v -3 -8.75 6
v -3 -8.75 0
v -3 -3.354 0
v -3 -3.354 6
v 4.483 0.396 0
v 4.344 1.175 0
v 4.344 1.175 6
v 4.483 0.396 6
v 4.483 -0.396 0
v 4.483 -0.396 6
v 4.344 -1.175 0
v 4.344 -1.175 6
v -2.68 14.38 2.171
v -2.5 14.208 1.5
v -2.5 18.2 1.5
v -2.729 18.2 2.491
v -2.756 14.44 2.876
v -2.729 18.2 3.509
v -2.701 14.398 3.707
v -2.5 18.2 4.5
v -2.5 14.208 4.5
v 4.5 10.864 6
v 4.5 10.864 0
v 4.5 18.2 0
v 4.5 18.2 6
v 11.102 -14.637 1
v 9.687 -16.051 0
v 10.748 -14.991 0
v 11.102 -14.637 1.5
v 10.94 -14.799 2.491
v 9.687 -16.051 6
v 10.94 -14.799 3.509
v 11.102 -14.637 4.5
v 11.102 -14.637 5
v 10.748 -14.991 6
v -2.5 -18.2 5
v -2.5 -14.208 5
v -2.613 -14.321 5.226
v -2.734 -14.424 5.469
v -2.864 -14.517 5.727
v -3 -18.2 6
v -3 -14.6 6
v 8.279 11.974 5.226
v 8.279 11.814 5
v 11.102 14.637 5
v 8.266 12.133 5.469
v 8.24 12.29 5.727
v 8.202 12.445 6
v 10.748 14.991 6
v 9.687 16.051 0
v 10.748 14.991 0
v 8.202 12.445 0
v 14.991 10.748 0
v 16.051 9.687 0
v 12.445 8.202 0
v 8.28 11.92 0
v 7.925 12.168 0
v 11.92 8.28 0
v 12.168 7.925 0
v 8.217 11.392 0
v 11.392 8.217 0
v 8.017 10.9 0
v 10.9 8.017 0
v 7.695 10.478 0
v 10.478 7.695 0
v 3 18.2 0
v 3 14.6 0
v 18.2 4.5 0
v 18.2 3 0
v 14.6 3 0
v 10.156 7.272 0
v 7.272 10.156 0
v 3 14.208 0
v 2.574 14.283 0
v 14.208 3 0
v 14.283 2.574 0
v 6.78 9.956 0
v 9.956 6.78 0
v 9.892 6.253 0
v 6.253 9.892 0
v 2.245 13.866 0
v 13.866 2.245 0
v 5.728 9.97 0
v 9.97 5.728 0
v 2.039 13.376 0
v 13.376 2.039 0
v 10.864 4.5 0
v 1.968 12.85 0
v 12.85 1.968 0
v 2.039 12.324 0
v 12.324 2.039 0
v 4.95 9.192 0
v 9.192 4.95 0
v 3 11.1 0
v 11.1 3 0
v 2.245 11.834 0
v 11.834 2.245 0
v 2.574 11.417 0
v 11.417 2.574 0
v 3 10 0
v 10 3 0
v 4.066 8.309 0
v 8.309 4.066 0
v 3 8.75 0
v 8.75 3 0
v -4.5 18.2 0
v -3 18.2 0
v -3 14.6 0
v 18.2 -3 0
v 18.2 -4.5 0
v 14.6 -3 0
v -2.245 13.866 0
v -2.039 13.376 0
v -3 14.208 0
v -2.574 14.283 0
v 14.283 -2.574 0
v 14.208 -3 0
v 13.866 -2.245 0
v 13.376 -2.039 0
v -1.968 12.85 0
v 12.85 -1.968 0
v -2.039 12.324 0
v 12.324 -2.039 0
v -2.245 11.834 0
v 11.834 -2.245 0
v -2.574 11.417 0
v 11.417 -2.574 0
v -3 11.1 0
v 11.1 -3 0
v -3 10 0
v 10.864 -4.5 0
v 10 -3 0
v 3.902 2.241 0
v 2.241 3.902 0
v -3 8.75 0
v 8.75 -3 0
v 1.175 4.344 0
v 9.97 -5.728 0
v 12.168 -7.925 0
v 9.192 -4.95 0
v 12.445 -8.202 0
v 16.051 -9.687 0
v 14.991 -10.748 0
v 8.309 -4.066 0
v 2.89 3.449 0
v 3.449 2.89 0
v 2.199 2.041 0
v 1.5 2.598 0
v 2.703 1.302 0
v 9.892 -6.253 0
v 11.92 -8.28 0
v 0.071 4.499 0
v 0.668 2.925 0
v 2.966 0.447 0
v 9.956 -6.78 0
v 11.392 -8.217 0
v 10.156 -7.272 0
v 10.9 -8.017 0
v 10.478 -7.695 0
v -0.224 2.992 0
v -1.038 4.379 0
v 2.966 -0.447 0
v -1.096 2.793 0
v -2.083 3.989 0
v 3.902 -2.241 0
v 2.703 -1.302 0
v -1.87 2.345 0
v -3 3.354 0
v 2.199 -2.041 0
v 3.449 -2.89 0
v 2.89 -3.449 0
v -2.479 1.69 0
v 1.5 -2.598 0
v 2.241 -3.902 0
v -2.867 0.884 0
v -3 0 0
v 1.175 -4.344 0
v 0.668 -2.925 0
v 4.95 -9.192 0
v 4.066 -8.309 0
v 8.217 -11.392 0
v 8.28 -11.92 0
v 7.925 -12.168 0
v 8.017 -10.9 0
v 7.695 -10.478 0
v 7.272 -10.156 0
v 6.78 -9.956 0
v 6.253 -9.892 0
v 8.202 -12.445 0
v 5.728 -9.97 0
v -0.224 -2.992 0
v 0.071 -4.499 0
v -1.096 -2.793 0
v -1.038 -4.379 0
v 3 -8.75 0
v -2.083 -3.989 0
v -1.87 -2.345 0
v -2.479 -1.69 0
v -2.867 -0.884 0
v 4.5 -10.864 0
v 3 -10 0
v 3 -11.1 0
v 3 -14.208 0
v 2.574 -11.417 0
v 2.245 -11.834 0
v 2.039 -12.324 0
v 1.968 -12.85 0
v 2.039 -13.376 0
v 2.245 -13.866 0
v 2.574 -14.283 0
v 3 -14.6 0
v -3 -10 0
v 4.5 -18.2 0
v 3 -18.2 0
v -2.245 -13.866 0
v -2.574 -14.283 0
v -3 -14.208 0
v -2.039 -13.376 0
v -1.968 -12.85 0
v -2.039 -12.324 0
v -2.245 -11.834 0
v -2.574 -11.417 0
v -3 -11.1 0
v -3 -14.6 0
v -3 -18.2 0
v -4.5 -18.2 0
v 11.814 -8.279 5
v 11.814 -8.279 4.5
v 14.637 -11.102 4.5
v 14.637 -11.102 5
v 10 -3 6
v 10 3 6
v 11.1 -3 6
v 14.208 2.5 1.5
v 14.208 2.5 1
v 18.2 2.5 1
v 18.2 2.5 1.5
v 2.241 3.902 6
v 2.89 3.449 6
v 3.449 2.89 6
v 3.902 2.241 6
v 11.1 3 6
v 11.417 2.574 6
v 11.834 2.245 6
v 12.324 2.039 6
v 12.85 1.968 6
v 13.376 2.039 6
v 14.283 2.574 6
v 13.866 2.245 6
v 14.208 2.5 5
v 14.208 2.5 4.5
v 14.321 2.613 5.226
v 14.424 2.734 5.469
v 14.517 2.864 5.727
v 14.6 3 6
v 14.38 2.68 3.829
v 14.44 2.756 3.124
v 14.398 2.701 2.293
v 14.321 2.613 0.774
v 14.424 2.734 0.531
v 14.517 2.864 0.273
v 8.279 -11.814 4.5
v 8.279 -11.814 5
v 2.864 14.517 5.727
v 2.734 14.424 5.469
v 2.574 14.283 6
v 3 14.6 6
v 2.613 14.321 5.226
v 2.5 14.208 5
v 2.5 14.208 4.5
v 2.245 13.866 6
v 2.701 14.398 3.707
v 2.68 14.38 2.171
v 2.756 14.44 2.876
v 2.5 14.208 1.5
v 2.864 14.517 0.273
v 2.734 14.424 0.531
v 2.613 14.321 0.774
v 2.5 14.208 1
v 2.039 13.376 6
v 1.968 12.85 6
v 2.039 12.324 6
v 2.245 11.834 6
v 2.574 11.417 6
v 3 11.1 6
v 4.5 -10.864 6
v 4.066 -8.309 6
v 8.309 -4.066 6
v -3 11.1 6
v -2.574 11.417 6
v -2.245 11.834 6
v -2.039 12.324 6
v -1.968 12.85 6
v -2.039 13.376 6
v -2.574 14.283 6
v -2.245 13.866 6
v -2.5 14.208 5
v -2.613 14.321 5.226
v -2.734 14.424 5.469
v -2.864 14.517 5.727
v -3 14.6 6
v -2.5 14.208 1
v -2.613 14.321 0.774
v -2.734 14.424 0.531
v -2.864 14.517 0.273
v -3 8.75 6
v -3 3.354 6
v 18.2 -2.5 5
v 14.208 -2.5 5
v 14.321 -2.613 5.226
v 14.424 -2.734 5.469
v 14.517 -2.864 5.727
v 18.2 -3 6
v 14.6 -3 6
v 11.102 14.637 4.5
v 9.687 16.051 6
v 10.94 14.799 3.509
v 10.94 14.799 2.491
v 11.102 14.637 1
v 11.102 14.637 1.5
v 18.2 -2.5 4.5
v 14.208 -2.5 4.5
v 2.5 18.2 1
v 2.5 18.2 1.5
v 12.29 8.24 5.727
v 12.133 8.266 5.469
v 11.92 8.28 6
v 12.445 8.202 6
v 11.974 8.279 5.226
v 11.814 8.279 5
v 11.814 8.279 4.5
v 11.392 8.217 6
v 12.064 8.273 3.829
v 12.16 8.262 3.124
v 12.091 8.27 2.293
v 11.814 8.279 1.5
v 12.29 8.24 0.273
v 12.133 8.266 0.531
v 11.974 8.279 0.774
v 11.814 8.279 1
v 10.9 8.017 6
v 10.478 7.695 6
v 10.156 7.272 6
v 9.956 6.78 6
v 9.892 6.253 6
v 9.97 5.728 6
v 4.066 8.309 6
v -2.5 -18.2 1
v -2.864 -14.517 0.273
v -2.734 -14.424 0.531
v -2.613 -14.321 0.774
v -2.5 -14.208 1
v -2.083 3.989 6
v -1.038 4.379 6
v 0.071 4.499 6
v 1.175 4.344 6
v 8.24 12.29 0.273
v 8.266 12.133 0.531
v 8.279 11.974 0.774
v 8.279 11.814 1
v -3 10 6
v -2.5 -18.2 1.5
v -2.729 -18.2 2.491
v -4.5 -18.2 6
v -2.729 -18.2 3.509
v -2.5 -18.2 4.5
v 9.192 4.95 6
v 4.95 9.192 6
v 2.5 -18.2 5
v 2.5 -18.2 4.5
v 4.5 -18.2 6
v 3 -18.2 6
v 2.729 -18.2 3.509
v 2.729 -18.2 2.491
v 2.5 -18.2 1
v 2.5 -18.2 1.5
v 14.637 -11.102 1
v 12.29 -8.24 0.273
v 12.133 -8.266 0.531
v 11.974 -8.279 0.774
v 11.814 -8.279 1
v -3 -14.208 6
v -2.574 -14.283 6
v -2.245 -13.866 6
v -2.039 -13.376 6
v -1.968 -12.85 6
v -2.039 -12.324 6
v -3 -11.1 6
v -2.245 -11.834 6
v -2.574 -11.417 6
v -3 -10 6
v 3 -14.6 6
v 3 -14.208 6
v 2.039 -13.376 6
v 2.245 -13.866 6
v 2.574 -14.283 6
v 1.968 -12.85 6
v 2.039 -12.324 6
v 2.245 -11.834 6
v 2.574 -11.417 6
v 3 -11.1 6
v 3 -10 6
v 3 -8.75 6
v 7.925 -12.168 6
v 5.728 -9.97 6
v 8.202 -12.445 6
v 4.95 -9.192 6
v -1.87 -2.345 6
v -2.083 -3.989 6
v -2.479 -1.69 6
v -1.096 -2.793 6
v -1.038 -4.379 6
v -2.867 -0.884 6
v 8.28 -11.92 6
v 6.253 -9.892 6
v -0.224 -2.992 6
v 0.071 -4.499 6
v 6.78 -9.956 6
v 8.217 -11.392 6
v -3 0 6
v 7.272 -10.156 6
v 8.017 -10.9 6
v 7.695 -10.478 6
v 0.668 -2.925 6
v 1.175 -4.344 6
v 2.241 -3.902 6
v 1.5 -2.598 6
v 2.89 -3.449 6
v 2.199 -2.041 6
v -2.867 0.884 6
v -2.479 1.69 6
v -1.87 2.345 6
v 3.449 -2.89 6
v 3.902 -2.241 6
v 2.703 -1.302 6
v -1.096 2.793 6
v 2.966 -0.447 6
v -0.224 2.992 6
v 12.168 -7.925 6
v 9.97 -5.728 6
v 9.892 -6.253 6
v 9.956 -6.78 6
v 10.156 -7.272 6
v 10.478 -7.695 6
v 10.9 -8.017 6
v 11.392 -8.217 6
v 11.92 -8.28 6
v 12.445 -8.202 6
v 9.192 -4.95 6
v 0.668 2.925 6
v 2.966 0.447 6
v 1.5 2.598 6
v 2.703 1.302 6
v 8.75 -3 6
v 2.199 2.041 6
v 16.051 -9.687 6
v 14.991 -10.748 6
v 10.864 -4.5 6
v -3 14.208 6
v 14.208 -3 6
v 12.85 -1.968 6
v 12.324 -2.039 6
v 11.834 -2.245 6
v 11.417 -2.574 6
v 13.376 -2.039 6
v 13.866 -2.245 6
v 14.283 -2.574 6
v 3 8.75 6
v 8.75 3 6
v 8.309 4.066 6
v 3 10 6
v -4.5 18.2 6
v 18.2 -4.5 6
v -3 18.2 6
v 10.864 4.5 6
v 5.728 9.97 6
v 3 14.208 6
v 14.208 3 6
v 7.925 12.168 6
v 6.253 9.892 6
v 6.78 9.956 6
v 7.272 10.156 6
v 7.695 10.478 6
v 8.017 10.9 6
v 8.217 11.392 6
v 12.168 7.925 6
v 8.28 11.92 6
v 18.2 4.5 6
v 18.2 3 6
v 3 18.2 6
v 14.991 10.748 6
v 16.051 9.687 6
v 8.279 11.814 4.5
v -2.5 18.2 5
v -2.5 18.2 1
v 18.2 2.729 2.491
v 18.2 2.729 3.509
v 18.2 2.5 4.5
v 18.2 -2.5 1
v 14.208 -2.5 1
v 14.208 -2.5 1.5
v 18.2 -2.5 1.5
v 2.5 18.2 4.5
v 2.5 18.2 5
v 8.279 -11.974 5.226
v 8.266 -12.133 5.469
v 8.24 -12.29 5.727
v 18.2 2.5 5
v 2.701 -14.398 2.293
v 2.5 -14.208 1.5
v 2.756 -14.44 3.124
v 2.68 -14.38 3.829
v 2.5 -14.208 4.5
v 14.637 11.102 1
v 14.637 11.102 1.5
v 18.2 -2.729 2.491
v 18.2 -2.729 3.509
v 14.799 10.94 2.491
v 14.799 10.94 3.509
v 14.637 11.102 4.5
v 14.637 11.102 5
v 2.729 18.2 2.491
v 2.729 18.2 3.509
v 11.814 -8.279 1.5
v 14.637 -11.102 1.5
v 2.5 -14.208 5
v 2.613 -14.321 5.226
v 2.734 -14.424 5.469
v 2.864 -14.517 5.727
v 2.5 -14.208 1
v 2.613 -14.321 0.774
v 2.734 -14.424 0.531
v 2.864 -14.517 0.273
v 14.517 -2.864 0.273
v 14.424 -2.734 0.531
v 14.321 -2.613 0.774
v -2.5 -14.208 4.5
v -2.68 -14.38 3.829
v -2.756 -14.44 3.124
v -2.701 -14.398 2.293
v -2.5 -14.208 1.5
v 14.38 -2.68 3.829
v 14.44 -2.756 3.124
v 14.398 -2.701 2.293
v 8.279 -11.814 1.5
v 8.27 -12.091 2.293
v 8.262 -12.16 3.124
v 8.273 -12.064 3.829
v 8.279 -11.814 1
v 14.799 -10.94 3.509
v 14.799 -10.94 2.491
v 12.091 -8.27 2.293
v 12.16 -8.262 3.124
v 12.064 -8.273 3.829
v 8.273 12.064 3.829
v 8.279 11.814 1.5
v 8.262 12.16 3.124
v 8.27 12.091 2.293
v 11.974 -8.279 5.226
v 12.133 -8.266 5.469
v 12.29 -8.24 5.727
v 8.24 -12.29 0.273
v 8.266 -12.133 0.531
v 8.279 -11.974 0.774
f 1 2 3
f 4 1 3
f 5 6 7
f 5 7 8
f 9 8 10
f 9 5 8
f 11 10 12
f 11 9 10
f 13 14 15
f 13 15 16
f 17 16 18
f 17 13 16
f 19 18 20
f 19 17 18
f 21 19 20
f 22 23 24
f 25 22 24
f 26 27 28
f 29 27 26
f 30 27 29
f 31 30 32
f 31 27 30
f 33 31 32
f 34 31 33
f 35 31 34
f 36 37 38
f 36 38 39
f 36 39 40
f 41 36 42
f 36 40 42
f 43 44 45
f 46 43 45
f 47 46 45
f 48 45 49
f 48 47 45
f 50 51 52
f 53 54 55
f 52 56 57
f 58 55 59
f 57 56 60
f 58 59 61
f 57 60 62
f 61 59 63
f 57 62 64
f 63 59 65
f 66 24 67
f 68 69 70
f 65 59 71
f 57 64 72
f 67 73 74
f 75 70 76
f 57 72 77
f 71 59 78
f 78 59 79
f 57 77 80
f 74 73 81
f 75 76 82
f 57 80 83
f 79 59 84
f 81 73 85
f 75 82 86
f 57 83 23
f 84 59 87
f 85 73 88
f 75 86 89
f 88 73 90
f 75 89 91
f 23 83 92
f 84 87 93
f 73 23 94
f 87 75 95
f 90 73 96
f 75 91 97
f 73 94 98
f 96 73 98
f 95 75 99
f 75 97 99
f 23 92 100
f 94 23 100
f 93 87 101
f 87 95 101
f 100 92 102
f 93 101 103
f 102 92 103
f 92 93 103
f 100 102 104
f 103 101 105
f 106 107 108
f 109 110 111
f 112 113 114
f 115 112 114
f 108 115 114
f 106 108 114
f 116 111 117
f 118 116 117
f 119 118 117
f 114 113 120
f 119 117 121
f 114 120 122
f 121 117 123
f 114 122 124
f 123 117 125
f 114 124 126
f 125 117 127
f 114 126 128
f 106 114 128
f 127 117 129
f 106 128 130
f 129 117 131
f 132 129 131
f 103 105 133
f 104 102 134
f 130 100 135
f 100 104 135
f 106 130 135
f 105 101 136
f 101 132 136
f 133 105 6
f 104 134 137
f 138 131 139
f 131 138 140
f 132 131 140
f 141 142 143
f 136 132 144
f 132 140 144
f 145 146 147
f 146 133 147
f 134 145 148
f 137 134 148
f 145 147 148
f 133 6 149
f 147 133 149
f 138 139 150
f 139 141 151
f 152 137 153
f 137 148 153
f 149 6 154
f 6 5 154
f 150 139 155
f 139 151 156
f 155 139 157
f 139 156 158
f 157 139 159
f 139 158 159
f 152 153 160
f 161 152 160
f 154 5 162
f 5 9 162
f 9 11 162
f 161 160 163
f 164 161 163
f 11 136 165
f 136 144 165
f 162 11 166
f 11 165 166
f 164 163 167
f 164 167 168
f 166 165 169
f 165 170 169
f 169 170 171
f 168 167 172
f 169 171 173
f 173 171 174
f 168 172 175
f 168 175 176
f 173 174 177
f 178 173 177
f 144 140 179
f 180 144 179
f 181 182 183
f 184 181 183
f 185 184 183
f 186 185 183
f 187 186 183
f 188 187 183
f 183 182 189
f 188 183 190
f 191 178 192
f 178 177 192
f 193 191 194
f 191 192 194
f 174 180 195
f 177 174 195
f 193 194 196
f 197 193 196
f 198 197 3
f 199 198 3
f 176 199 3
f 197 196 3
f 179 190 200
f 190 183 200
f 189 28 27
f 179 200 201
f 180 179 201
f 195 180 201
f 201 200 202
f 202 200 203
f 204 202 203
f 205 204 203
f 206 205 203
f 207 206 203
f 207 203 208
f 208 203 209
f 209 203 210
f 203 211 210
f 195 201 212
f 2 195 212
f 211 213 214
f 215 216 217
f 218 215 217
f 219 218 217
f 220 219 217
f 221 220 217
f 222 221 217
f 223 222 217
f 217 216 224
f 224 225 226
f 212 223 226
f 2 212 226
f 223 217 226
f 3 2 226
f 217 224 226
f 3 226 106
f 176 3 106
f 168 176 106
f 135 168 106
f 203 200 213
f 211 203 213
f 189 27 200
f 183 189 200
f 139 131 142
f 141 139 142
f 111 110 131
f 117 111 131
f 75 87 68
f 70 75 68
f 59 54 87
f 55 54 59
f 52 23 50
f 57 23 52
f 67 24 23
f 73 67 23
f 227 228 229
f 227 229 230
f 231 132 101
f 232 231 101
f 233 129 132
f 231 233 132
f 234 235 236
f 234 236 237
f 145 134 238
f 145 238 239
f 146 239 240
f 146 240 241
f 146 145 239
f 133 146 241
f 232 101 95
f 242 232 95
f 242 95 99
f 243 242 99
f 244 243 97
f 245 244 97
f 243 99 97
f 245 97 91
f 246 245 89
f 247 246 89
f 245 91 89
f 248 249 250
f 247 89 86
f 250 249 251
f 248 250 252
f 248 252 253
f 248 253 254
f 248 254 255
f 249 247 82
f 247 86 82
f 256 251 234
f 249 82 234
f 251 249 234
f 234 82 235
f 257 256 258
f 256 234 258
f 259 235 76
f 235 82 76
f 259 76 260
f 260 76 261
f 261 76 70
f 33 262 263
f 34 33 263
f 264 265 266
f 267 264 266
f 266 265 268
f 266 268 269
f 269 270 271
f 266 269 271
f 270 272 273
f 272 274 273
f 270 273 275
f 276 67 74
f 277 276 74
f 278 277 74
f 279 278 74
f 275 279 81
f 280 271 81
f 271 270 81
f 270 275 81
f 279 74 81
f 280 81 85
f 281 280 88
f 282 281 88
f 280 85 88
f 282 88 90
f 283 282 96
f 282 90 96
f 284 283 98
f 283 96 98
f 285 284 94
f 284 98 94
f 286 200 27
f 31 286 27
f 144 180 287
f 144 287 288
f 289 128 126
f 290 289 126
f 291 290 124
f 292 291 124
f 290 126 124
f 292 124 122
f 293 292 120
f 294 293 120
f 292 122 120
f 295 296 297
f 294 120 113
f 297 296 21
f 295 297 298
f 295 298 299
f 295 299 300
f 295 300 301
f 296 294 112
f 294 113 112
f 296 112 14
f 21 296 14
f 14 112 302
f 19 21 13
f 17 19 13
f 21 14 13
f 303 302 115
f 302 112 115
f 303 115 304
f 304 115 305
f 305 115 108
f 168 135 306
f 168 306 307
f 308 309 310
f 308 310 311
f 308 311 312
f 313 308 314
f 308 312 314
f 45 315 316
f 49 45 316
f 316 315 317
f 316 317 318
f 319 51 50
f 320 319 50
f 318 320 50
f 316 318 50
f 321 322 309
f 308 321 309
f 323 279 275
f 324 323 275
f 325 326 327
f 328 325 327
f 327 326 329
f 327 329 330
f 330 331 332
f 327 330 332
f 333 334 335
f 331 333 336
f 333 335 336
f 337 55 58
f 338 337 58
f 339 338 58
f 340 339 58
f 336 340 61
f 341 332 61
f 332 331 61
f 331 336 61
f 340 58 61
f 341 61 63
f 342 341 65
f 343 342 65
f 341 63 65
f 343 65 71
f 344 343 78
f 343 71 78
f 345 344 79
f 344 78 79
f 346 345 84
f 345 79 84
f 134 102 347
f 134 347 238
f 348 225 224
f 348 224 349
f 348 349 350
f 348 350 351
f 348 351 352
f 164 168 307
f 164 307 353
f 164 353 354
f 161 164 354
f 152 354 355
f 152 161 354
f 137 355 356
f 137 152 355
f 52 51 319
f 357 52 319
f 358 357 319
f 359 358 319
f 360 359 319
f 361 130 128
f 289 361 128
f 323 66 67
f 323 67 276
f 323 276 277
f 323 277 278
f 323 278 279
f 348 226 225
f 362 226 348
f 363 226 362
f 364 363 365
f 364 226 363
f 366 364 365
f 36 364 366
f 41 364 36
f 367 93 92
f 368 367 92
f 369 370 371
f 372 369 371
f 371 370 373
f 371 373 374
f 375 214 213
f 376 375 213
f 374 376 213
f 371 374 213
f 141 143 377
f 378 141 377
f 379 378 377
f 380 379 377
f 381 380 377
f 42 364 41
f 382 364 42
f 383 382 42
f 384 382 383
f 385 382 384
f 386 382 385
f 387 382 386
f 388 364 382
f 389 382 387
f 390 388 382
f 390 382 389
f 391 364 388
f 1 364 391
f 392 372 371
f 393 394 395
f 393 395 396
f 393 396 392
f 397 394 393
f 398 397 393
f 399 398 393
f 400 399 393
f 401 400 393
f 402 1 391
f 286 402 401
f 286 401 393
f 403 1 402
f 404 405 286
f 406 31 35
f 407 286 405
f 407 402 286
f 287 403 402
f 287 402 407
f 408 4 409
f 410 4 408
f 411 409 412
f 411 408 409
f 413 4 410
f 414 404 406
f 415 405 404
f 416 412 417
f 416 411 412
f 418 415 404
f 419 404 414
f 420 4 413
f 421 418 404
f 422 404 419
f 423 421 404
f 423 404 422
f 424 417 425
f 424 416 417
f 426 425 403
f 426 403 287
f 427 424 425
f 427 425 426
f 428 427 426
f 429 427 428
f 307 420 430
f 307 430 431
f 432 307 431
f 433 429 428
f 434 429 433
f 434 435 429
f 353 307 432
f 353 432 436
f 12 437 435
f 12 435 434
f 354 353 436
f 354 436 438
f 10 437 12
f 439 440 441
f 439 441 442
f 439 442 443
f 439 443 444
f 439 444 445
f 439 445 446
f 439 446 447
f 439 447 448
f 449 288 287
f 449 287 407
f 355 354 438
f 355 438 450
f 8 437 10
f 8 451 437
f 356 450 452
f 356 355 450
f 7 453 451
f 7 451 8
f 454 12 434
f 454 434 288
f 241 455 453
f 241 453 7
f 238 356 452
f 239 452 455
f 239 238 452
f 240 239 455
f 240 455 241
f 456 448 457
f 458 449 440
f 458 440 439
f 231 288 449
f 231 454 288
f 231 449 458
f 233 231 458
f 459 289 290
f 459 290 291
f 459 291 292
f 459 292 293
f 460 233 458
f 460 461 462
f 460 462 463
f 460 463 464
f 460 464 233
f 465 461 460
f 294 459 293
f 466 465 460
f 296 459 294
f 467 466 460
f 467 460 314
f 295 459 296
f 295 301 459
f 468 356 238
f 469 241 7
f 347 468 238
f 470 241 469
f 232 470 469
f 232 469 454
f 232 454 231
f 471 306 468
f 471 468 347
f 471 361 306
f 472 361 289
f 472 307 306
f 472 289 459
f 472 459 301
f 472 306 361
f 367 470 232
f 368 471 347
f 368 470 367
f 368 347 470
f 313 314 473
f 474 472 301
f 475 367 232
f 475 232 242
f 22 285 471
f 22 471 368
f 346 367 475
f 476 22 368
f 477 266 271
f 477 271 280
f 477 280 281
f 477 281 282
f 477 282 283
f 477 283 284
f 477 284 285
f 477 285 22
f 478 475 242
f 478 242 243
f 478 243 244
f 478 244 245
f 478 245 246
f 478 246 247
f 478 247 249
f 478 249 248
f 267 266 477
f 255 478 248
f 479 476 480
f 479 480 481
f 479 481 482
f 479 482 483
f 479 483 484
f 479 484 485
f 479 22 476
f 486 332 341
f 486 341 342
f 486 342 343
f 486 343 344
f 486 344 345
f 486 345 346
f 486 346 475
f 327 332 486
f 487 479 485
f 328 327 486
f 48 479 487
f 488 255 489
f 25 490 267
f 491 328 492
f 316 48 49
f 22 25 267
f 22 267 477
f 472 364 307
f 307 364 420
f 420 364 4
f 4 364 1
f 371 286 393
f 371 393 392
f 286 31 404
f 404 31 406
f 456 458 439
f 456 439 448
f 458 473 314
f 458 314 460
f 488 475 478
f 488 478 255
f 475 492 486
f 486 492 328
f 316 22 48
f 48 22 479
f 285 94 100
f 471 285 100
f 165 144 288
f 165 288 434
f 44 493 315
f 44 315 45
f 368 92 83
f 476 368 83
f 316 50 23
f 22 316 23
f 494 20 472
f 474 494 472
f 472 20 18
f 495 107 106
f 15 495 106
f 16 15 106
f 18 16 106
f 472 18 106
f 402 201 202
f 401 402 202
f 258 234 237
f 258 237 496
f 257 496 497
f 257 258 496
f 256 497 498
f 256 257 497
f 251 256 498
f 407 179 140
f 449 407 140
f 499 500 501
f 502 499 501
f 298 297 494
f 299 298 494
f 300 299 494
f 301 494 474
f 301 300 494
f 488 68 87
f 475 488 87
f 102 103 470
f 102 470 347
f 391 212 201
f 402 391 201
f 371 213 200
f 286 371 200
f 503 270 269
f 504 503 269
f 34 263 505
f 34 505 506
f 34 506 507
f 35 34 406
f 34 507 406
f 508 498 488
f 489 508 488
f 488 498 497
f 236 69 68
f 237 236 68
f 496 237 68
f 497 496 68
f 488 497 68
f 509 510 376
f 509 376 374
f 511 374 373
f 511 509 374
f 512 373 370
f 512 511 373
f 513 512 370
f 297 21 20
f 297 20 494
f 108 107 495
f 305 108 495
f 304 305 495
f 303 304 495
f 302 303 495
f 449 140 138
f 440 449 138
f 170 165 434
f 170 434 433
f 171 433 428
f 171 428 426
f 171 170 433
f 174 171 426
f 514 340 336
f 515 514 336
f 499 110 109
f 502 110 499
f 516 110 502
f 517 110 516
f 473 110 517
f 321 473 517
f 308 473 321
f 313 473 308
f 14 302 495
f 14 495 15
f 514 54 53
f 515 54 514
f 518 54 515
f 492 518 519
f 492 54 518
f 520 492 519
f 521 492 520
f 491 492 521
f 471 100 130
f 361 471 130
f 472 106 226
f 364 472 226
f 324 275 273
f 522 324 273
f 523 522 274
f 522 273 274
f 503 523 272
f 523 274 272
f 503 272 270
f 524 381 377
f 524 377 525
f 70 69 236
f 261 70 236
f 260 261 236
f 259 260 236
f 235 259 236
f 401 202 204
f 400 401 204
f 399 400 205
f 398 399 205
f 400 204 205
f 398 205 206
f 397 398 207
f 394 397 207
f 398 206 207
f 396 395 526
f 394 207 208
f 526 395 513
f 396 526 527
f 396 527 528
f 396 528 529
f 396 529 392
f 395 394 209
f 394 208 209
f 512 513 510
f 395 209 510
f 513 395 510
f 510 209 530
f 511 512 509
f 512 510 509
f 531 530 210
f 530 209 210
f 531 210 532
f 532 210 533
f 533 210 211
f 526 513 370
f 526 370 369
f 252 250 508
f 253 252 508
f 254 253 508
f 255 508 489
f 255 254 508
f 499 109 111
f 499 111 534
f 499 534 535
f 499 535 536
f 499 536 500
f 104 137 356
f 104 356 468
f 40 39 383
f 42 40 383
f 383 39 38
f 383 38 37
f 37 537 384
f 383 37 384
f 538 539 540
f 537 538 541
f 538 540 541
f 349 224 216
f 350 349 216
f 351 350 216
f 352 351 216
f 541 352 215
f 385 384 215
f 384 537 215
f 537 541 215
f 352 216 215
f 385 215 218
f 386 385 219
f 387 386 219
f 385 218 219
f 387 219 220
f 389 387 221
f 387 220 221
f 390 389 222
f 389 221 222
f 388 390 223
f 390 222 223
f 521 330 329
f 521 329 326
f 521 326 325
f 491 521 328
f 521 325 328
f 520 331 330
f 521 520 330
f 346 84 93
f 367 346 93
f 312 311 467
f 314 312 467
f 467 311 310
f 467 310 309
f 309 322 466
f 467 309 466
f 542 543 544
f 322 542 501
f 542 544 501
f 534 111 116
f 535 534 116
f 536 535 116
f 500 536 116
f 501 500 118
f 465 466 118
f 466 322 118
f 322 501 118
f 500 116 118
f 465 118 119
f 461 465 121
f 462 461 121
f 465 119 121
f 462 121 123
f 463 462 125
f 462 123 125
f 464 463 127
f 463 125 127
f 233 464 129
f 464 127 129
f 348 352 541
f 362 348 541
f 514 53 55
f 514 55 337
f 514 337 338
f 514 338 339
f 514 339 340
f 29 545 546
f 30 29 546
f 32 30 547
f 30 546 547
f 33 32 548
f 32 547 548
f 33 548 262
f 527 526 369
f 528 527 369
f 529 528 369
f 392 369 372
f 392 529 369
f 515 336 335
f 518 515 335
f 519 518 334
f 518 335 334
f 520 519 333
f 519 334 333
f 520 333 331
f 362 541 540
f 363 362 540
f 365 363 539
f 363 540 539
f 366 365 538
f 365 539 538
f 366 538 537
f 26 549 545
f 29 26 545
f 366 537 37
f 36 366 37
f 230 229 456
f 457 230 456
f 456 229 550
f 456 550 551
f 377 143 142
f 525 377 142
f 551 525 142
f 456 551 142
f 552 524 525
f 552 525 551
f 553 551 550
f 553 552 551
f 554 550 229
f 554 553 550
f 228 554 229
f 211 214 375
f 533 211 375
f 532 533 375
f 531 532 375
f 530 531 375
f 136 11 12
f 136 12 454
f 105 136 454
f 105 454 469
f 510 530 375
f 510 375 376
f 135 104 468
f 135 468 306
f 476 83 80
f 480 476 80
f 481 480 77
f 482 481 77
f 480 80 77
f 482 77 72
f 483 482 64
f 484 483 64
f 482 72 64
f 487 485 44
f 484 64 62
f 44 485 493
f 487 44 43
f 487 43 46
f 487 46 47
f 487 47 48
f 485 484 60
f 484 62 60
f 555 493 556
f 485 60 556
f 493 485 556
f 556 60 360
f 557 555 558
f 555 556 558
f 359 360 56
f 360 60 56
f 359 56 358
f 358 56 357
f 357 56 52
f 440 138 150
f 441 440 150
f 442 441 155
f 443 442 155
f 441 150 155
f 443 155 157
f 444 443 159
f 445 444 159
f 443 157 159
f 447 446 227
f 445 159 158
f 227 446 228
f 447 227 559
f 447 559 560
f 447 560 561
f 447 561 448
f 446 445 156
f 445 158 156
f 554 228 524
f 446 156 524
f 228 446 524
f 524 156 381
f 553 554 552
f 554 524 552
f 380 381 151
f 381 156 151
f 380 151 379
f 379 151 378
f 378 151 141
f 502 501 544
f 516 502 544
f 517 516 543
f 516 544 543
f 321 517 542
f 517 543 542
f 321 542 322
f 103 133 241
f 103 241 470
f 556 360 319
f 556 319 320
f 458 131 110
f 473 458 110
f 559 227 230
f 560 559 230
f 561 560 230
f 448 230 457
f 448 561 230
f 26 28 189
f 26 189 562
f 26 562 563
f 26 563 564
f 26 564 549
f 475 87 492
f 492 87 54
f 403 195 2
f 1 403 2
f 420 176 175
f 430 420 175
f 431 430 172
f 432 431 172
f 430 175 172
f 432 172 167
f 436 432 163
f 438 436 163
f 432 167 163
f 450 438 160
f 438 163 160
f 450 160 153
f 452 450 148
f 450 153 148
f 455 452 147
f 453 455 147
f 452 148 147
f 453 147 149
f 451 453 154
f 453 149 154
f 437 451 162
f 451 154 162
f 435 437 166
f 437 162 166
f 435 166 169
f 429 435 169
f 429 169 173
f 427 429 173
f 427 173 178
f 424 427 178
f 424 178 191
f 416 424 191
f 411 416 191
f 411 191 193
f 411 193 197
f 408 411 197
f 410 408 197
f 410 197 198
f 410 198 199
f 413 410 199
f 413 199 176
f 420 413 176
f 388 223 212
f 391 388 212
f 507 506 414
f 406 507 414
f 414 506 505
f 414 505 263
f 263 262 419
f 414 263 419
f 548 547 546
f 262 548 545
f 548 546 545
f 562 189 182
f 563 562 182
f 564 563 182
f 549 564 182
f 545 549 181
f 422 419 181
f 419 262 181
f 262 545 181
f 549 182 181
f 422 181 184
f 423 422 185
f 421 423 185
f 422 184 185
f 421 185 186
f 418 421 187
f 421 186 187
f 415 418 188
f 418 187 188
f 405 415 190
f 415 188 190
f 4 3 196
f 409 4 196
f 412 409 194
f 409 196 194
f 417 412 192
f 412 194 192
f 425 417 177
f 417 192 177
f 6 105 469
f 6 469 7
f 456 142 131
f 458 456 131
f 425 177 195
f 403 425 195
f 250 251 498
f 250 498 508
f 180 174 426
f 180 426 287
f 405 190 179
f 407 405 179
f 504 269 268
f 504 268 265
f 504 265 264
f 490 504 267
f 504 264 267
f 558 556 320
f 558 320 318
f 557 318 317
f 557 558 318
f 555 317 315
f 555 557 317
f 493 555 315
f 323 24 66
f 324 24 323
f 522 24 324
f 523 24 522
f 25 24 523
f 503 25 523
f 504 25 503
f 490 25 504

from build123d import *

# Parameters (mm, degrees)
EXTRUDE_1_DEPTH          = 6
EXTRUDE_2_REACH          = 25.907
PATTERN_CIRCULAR_1_COUNT = 5
PATTERN_CIRCULAR_1_ANGLE = 180
SKETCH_4_R               = 3
CUT_EXTRUDE_1_DEPTH      = 27.42877236


with BuildPart() as part:
    # 草图1 → 凸台-拉伸1 (new body)
    with BuildSketch(Plane.XY):
        with BuildLine():
            Line((-4.5, 0), (-4.5, -18.2))
            Line((-4.5, -18.2), (-3, -18.2))
            Line((-3, -18.2), (-3, -14.6))
            ThreePointArc((-3, -14.6), (-1.968245837, -12.85), (-3, -11.1))
            Line((-3, -11.1), (-3, -10))
            Line((-3, -10), (3, -10))
            Line((3, -10), (3, -11.1))
            ThreePointArc((3, -11.1), (1.968245837, -12.85), (3, -14.6))
            Line((3, -14.6), (3, -18.2))
            Line((3, -18.2), (4.5, -18.2))
            Line((4.5, -18.2), (4.5, 0))
            ThreePointArc((4.5, 0), (0, 4.5), (-4.5, 0))
        make_face()
    extrude_1 = extrude(amount=EXTRUDE_1_DEPTH)

    # 草图3 → 凸台-拉伸2 (add, up to next)
    with BuildSketch(Plane.XZ.offset(18.2), mode=Mode.PRIVATE) as extrude_2_sk1:
        with BuildLine():
            Line((-3, 6), (-3, 0))
            Line((-3, 0), (-2.5, 1))
            Line((-2.5, 1), (-2.5, 1.5))
            ThreePointArc((-2.5, 1.5), (-2.757359313, 3), (-2.5, 4.5))
            Line((-2.5, 4.5), (-2.5, 5))
            Line((-2.5, 5), (-3, 6))
        make_face()
    extrude_2_tool1 = extrude(extrude_2_sk1.sketch, amount=-EXTRUDE_2_REACH, mode=Mode.PRIVATE) - part.part
    # 草图3 → 凸台-拉伸2 (add, up to next)
    with BuildSketch(Plane.XZ.offset(18.2), mode=Mode.PRIVATE) as extrude_2_sk2:
        with BuildLine():
            Line((3, 0), (2.5, 1))
            Line((2.5, 1), (2.5, 1.5))
            ThreePointArc((2.5, 1.5), (2.757359313, 3), (2.5, 4.5))
            Line((2.5, 4.5), (2.5, 5))
            Line((2.5, 5), (3, 6))
            Line((3, 6), (3, 0))
        make_face()
    extrude_2_tool2 = extrude(extrude_2_sk2.sketch, amount=-EXTRUDE_2_REACH, mode=Mode.PRIVATE) - part.part
    extrude_2_1 = extrude_2_tool1.solids().sort_by_distance((-2.809362, -18.2, 3))[0]
    add(extrude_2_1)
    extrude_2_2 = extrude_2_tool2.solids().sort_by_distance((2.809362, -18.2, 3))[0]
    add(extrude_2_2)
    extrude_2 = extrude_2_1 + extrude_2_2  # 凸台-拉伸2 as one shape, for the pattern or mirror that repeats it

    # 阵列(圆周)1: 凸台-拉伸1, 凸台-拉伸2 ×5 about axis
    pattern_circular_1_axis = Axis((0, 0, 0), (0, 0, 1))
    add([extrude_1.rotate(pattern_circular_1_axis, i * PATTERN_CIRCULAR_1_ANGLE / (PATTERN_CIRCULAR_1_COUNT - 1)) for i in range(1, PATTERN_CIRCULAR_1_COUNT)])
    add([extrude_2.rotate(pattern_circular_1_axis, i * PATTERN_CIRCULAR_1_ANGLE / (PATTERN_CIRCULAR_1_COUNT - 1)) for i in range(1, PATTERN_CIRCULAR_1_COUNT)])

    # 草图4 → 切除-拉伸1 (cut, through all)
    with BuildSketch(Plane(origin=(0, 0, 0), x_dir=(-1, 0, 0), z_dir=(0, 0, -1))):
        Circle(SKETCH_4_R)
        with BuildLine():
            Line((3, -8.75), (3, -3.354101966))
            ThreePointArc((3, -3.354101966), (1.038095674, -4.378625055), (-1.174936357, -4.343906601))
            Line((-1.174936357, -4.343906601), (-3, -8.75))
            Line((-3, -8.75), (3, -8.75))
        make_face()
        with BuildLine():
            Line((-4.065863992, -8.308504679), (-8.308504679, -4.065863992))
            Line((-8.308504679, -4.065863992), (-3.90241128, -2.240800349))
            ThreePointArc((-3.90241128, -2.240800349), (-3.181980515, -3.181980515), (-2.240800349, -3.90241128))
            Line((-2.240800349, -3.90241128), (-4.065863992, -8.308504679))
        make_face()
        with BuildLine():
            Line((3, 8.75), (3, 3.354101966))
            ThreePointArc((3, 3.354101966), (1.038095674, 4.378625055), (-1.174936357, 4.343906601))
            Line((-1.174936357, 4.343906601), (-3, 8.75))
            Line((-3, 8.75), (3, 8.75))
        make_face()
        with BuildLine():
            Line((-8.75, 3), (-4.343906601, 1.174936357))
            ThreePointArc((-4.343906601, 1.174936357), (-4.5, 0), (-4.343906601, -1.174936357))
            Line((-4.343906601, -1.174936357), (-8.75, -3))
            Line((-8.75, -3), (-8.75, 3))
        make_face()
        with BuildLine():
            Line((-4.065863992, 8.308504679), (-2.240800349, 3.90241128))
            ThreePointArc((-2.240800349, 3.90241128), (-3.181980515, 3.181980515), (-3.90241128, 2.240800349))
            Line((-3.90241128, 2.240800349), (-8.308504679, 4.065863992))
            Line((-8.308504679, 4.065863992), (-4.065863992, 8.308504679))
        make_face()
    extrude(amount=-CUT_EXTRUDE_1_DEPTH, mode=Mode.SUBTRACT)


solid = part.part
